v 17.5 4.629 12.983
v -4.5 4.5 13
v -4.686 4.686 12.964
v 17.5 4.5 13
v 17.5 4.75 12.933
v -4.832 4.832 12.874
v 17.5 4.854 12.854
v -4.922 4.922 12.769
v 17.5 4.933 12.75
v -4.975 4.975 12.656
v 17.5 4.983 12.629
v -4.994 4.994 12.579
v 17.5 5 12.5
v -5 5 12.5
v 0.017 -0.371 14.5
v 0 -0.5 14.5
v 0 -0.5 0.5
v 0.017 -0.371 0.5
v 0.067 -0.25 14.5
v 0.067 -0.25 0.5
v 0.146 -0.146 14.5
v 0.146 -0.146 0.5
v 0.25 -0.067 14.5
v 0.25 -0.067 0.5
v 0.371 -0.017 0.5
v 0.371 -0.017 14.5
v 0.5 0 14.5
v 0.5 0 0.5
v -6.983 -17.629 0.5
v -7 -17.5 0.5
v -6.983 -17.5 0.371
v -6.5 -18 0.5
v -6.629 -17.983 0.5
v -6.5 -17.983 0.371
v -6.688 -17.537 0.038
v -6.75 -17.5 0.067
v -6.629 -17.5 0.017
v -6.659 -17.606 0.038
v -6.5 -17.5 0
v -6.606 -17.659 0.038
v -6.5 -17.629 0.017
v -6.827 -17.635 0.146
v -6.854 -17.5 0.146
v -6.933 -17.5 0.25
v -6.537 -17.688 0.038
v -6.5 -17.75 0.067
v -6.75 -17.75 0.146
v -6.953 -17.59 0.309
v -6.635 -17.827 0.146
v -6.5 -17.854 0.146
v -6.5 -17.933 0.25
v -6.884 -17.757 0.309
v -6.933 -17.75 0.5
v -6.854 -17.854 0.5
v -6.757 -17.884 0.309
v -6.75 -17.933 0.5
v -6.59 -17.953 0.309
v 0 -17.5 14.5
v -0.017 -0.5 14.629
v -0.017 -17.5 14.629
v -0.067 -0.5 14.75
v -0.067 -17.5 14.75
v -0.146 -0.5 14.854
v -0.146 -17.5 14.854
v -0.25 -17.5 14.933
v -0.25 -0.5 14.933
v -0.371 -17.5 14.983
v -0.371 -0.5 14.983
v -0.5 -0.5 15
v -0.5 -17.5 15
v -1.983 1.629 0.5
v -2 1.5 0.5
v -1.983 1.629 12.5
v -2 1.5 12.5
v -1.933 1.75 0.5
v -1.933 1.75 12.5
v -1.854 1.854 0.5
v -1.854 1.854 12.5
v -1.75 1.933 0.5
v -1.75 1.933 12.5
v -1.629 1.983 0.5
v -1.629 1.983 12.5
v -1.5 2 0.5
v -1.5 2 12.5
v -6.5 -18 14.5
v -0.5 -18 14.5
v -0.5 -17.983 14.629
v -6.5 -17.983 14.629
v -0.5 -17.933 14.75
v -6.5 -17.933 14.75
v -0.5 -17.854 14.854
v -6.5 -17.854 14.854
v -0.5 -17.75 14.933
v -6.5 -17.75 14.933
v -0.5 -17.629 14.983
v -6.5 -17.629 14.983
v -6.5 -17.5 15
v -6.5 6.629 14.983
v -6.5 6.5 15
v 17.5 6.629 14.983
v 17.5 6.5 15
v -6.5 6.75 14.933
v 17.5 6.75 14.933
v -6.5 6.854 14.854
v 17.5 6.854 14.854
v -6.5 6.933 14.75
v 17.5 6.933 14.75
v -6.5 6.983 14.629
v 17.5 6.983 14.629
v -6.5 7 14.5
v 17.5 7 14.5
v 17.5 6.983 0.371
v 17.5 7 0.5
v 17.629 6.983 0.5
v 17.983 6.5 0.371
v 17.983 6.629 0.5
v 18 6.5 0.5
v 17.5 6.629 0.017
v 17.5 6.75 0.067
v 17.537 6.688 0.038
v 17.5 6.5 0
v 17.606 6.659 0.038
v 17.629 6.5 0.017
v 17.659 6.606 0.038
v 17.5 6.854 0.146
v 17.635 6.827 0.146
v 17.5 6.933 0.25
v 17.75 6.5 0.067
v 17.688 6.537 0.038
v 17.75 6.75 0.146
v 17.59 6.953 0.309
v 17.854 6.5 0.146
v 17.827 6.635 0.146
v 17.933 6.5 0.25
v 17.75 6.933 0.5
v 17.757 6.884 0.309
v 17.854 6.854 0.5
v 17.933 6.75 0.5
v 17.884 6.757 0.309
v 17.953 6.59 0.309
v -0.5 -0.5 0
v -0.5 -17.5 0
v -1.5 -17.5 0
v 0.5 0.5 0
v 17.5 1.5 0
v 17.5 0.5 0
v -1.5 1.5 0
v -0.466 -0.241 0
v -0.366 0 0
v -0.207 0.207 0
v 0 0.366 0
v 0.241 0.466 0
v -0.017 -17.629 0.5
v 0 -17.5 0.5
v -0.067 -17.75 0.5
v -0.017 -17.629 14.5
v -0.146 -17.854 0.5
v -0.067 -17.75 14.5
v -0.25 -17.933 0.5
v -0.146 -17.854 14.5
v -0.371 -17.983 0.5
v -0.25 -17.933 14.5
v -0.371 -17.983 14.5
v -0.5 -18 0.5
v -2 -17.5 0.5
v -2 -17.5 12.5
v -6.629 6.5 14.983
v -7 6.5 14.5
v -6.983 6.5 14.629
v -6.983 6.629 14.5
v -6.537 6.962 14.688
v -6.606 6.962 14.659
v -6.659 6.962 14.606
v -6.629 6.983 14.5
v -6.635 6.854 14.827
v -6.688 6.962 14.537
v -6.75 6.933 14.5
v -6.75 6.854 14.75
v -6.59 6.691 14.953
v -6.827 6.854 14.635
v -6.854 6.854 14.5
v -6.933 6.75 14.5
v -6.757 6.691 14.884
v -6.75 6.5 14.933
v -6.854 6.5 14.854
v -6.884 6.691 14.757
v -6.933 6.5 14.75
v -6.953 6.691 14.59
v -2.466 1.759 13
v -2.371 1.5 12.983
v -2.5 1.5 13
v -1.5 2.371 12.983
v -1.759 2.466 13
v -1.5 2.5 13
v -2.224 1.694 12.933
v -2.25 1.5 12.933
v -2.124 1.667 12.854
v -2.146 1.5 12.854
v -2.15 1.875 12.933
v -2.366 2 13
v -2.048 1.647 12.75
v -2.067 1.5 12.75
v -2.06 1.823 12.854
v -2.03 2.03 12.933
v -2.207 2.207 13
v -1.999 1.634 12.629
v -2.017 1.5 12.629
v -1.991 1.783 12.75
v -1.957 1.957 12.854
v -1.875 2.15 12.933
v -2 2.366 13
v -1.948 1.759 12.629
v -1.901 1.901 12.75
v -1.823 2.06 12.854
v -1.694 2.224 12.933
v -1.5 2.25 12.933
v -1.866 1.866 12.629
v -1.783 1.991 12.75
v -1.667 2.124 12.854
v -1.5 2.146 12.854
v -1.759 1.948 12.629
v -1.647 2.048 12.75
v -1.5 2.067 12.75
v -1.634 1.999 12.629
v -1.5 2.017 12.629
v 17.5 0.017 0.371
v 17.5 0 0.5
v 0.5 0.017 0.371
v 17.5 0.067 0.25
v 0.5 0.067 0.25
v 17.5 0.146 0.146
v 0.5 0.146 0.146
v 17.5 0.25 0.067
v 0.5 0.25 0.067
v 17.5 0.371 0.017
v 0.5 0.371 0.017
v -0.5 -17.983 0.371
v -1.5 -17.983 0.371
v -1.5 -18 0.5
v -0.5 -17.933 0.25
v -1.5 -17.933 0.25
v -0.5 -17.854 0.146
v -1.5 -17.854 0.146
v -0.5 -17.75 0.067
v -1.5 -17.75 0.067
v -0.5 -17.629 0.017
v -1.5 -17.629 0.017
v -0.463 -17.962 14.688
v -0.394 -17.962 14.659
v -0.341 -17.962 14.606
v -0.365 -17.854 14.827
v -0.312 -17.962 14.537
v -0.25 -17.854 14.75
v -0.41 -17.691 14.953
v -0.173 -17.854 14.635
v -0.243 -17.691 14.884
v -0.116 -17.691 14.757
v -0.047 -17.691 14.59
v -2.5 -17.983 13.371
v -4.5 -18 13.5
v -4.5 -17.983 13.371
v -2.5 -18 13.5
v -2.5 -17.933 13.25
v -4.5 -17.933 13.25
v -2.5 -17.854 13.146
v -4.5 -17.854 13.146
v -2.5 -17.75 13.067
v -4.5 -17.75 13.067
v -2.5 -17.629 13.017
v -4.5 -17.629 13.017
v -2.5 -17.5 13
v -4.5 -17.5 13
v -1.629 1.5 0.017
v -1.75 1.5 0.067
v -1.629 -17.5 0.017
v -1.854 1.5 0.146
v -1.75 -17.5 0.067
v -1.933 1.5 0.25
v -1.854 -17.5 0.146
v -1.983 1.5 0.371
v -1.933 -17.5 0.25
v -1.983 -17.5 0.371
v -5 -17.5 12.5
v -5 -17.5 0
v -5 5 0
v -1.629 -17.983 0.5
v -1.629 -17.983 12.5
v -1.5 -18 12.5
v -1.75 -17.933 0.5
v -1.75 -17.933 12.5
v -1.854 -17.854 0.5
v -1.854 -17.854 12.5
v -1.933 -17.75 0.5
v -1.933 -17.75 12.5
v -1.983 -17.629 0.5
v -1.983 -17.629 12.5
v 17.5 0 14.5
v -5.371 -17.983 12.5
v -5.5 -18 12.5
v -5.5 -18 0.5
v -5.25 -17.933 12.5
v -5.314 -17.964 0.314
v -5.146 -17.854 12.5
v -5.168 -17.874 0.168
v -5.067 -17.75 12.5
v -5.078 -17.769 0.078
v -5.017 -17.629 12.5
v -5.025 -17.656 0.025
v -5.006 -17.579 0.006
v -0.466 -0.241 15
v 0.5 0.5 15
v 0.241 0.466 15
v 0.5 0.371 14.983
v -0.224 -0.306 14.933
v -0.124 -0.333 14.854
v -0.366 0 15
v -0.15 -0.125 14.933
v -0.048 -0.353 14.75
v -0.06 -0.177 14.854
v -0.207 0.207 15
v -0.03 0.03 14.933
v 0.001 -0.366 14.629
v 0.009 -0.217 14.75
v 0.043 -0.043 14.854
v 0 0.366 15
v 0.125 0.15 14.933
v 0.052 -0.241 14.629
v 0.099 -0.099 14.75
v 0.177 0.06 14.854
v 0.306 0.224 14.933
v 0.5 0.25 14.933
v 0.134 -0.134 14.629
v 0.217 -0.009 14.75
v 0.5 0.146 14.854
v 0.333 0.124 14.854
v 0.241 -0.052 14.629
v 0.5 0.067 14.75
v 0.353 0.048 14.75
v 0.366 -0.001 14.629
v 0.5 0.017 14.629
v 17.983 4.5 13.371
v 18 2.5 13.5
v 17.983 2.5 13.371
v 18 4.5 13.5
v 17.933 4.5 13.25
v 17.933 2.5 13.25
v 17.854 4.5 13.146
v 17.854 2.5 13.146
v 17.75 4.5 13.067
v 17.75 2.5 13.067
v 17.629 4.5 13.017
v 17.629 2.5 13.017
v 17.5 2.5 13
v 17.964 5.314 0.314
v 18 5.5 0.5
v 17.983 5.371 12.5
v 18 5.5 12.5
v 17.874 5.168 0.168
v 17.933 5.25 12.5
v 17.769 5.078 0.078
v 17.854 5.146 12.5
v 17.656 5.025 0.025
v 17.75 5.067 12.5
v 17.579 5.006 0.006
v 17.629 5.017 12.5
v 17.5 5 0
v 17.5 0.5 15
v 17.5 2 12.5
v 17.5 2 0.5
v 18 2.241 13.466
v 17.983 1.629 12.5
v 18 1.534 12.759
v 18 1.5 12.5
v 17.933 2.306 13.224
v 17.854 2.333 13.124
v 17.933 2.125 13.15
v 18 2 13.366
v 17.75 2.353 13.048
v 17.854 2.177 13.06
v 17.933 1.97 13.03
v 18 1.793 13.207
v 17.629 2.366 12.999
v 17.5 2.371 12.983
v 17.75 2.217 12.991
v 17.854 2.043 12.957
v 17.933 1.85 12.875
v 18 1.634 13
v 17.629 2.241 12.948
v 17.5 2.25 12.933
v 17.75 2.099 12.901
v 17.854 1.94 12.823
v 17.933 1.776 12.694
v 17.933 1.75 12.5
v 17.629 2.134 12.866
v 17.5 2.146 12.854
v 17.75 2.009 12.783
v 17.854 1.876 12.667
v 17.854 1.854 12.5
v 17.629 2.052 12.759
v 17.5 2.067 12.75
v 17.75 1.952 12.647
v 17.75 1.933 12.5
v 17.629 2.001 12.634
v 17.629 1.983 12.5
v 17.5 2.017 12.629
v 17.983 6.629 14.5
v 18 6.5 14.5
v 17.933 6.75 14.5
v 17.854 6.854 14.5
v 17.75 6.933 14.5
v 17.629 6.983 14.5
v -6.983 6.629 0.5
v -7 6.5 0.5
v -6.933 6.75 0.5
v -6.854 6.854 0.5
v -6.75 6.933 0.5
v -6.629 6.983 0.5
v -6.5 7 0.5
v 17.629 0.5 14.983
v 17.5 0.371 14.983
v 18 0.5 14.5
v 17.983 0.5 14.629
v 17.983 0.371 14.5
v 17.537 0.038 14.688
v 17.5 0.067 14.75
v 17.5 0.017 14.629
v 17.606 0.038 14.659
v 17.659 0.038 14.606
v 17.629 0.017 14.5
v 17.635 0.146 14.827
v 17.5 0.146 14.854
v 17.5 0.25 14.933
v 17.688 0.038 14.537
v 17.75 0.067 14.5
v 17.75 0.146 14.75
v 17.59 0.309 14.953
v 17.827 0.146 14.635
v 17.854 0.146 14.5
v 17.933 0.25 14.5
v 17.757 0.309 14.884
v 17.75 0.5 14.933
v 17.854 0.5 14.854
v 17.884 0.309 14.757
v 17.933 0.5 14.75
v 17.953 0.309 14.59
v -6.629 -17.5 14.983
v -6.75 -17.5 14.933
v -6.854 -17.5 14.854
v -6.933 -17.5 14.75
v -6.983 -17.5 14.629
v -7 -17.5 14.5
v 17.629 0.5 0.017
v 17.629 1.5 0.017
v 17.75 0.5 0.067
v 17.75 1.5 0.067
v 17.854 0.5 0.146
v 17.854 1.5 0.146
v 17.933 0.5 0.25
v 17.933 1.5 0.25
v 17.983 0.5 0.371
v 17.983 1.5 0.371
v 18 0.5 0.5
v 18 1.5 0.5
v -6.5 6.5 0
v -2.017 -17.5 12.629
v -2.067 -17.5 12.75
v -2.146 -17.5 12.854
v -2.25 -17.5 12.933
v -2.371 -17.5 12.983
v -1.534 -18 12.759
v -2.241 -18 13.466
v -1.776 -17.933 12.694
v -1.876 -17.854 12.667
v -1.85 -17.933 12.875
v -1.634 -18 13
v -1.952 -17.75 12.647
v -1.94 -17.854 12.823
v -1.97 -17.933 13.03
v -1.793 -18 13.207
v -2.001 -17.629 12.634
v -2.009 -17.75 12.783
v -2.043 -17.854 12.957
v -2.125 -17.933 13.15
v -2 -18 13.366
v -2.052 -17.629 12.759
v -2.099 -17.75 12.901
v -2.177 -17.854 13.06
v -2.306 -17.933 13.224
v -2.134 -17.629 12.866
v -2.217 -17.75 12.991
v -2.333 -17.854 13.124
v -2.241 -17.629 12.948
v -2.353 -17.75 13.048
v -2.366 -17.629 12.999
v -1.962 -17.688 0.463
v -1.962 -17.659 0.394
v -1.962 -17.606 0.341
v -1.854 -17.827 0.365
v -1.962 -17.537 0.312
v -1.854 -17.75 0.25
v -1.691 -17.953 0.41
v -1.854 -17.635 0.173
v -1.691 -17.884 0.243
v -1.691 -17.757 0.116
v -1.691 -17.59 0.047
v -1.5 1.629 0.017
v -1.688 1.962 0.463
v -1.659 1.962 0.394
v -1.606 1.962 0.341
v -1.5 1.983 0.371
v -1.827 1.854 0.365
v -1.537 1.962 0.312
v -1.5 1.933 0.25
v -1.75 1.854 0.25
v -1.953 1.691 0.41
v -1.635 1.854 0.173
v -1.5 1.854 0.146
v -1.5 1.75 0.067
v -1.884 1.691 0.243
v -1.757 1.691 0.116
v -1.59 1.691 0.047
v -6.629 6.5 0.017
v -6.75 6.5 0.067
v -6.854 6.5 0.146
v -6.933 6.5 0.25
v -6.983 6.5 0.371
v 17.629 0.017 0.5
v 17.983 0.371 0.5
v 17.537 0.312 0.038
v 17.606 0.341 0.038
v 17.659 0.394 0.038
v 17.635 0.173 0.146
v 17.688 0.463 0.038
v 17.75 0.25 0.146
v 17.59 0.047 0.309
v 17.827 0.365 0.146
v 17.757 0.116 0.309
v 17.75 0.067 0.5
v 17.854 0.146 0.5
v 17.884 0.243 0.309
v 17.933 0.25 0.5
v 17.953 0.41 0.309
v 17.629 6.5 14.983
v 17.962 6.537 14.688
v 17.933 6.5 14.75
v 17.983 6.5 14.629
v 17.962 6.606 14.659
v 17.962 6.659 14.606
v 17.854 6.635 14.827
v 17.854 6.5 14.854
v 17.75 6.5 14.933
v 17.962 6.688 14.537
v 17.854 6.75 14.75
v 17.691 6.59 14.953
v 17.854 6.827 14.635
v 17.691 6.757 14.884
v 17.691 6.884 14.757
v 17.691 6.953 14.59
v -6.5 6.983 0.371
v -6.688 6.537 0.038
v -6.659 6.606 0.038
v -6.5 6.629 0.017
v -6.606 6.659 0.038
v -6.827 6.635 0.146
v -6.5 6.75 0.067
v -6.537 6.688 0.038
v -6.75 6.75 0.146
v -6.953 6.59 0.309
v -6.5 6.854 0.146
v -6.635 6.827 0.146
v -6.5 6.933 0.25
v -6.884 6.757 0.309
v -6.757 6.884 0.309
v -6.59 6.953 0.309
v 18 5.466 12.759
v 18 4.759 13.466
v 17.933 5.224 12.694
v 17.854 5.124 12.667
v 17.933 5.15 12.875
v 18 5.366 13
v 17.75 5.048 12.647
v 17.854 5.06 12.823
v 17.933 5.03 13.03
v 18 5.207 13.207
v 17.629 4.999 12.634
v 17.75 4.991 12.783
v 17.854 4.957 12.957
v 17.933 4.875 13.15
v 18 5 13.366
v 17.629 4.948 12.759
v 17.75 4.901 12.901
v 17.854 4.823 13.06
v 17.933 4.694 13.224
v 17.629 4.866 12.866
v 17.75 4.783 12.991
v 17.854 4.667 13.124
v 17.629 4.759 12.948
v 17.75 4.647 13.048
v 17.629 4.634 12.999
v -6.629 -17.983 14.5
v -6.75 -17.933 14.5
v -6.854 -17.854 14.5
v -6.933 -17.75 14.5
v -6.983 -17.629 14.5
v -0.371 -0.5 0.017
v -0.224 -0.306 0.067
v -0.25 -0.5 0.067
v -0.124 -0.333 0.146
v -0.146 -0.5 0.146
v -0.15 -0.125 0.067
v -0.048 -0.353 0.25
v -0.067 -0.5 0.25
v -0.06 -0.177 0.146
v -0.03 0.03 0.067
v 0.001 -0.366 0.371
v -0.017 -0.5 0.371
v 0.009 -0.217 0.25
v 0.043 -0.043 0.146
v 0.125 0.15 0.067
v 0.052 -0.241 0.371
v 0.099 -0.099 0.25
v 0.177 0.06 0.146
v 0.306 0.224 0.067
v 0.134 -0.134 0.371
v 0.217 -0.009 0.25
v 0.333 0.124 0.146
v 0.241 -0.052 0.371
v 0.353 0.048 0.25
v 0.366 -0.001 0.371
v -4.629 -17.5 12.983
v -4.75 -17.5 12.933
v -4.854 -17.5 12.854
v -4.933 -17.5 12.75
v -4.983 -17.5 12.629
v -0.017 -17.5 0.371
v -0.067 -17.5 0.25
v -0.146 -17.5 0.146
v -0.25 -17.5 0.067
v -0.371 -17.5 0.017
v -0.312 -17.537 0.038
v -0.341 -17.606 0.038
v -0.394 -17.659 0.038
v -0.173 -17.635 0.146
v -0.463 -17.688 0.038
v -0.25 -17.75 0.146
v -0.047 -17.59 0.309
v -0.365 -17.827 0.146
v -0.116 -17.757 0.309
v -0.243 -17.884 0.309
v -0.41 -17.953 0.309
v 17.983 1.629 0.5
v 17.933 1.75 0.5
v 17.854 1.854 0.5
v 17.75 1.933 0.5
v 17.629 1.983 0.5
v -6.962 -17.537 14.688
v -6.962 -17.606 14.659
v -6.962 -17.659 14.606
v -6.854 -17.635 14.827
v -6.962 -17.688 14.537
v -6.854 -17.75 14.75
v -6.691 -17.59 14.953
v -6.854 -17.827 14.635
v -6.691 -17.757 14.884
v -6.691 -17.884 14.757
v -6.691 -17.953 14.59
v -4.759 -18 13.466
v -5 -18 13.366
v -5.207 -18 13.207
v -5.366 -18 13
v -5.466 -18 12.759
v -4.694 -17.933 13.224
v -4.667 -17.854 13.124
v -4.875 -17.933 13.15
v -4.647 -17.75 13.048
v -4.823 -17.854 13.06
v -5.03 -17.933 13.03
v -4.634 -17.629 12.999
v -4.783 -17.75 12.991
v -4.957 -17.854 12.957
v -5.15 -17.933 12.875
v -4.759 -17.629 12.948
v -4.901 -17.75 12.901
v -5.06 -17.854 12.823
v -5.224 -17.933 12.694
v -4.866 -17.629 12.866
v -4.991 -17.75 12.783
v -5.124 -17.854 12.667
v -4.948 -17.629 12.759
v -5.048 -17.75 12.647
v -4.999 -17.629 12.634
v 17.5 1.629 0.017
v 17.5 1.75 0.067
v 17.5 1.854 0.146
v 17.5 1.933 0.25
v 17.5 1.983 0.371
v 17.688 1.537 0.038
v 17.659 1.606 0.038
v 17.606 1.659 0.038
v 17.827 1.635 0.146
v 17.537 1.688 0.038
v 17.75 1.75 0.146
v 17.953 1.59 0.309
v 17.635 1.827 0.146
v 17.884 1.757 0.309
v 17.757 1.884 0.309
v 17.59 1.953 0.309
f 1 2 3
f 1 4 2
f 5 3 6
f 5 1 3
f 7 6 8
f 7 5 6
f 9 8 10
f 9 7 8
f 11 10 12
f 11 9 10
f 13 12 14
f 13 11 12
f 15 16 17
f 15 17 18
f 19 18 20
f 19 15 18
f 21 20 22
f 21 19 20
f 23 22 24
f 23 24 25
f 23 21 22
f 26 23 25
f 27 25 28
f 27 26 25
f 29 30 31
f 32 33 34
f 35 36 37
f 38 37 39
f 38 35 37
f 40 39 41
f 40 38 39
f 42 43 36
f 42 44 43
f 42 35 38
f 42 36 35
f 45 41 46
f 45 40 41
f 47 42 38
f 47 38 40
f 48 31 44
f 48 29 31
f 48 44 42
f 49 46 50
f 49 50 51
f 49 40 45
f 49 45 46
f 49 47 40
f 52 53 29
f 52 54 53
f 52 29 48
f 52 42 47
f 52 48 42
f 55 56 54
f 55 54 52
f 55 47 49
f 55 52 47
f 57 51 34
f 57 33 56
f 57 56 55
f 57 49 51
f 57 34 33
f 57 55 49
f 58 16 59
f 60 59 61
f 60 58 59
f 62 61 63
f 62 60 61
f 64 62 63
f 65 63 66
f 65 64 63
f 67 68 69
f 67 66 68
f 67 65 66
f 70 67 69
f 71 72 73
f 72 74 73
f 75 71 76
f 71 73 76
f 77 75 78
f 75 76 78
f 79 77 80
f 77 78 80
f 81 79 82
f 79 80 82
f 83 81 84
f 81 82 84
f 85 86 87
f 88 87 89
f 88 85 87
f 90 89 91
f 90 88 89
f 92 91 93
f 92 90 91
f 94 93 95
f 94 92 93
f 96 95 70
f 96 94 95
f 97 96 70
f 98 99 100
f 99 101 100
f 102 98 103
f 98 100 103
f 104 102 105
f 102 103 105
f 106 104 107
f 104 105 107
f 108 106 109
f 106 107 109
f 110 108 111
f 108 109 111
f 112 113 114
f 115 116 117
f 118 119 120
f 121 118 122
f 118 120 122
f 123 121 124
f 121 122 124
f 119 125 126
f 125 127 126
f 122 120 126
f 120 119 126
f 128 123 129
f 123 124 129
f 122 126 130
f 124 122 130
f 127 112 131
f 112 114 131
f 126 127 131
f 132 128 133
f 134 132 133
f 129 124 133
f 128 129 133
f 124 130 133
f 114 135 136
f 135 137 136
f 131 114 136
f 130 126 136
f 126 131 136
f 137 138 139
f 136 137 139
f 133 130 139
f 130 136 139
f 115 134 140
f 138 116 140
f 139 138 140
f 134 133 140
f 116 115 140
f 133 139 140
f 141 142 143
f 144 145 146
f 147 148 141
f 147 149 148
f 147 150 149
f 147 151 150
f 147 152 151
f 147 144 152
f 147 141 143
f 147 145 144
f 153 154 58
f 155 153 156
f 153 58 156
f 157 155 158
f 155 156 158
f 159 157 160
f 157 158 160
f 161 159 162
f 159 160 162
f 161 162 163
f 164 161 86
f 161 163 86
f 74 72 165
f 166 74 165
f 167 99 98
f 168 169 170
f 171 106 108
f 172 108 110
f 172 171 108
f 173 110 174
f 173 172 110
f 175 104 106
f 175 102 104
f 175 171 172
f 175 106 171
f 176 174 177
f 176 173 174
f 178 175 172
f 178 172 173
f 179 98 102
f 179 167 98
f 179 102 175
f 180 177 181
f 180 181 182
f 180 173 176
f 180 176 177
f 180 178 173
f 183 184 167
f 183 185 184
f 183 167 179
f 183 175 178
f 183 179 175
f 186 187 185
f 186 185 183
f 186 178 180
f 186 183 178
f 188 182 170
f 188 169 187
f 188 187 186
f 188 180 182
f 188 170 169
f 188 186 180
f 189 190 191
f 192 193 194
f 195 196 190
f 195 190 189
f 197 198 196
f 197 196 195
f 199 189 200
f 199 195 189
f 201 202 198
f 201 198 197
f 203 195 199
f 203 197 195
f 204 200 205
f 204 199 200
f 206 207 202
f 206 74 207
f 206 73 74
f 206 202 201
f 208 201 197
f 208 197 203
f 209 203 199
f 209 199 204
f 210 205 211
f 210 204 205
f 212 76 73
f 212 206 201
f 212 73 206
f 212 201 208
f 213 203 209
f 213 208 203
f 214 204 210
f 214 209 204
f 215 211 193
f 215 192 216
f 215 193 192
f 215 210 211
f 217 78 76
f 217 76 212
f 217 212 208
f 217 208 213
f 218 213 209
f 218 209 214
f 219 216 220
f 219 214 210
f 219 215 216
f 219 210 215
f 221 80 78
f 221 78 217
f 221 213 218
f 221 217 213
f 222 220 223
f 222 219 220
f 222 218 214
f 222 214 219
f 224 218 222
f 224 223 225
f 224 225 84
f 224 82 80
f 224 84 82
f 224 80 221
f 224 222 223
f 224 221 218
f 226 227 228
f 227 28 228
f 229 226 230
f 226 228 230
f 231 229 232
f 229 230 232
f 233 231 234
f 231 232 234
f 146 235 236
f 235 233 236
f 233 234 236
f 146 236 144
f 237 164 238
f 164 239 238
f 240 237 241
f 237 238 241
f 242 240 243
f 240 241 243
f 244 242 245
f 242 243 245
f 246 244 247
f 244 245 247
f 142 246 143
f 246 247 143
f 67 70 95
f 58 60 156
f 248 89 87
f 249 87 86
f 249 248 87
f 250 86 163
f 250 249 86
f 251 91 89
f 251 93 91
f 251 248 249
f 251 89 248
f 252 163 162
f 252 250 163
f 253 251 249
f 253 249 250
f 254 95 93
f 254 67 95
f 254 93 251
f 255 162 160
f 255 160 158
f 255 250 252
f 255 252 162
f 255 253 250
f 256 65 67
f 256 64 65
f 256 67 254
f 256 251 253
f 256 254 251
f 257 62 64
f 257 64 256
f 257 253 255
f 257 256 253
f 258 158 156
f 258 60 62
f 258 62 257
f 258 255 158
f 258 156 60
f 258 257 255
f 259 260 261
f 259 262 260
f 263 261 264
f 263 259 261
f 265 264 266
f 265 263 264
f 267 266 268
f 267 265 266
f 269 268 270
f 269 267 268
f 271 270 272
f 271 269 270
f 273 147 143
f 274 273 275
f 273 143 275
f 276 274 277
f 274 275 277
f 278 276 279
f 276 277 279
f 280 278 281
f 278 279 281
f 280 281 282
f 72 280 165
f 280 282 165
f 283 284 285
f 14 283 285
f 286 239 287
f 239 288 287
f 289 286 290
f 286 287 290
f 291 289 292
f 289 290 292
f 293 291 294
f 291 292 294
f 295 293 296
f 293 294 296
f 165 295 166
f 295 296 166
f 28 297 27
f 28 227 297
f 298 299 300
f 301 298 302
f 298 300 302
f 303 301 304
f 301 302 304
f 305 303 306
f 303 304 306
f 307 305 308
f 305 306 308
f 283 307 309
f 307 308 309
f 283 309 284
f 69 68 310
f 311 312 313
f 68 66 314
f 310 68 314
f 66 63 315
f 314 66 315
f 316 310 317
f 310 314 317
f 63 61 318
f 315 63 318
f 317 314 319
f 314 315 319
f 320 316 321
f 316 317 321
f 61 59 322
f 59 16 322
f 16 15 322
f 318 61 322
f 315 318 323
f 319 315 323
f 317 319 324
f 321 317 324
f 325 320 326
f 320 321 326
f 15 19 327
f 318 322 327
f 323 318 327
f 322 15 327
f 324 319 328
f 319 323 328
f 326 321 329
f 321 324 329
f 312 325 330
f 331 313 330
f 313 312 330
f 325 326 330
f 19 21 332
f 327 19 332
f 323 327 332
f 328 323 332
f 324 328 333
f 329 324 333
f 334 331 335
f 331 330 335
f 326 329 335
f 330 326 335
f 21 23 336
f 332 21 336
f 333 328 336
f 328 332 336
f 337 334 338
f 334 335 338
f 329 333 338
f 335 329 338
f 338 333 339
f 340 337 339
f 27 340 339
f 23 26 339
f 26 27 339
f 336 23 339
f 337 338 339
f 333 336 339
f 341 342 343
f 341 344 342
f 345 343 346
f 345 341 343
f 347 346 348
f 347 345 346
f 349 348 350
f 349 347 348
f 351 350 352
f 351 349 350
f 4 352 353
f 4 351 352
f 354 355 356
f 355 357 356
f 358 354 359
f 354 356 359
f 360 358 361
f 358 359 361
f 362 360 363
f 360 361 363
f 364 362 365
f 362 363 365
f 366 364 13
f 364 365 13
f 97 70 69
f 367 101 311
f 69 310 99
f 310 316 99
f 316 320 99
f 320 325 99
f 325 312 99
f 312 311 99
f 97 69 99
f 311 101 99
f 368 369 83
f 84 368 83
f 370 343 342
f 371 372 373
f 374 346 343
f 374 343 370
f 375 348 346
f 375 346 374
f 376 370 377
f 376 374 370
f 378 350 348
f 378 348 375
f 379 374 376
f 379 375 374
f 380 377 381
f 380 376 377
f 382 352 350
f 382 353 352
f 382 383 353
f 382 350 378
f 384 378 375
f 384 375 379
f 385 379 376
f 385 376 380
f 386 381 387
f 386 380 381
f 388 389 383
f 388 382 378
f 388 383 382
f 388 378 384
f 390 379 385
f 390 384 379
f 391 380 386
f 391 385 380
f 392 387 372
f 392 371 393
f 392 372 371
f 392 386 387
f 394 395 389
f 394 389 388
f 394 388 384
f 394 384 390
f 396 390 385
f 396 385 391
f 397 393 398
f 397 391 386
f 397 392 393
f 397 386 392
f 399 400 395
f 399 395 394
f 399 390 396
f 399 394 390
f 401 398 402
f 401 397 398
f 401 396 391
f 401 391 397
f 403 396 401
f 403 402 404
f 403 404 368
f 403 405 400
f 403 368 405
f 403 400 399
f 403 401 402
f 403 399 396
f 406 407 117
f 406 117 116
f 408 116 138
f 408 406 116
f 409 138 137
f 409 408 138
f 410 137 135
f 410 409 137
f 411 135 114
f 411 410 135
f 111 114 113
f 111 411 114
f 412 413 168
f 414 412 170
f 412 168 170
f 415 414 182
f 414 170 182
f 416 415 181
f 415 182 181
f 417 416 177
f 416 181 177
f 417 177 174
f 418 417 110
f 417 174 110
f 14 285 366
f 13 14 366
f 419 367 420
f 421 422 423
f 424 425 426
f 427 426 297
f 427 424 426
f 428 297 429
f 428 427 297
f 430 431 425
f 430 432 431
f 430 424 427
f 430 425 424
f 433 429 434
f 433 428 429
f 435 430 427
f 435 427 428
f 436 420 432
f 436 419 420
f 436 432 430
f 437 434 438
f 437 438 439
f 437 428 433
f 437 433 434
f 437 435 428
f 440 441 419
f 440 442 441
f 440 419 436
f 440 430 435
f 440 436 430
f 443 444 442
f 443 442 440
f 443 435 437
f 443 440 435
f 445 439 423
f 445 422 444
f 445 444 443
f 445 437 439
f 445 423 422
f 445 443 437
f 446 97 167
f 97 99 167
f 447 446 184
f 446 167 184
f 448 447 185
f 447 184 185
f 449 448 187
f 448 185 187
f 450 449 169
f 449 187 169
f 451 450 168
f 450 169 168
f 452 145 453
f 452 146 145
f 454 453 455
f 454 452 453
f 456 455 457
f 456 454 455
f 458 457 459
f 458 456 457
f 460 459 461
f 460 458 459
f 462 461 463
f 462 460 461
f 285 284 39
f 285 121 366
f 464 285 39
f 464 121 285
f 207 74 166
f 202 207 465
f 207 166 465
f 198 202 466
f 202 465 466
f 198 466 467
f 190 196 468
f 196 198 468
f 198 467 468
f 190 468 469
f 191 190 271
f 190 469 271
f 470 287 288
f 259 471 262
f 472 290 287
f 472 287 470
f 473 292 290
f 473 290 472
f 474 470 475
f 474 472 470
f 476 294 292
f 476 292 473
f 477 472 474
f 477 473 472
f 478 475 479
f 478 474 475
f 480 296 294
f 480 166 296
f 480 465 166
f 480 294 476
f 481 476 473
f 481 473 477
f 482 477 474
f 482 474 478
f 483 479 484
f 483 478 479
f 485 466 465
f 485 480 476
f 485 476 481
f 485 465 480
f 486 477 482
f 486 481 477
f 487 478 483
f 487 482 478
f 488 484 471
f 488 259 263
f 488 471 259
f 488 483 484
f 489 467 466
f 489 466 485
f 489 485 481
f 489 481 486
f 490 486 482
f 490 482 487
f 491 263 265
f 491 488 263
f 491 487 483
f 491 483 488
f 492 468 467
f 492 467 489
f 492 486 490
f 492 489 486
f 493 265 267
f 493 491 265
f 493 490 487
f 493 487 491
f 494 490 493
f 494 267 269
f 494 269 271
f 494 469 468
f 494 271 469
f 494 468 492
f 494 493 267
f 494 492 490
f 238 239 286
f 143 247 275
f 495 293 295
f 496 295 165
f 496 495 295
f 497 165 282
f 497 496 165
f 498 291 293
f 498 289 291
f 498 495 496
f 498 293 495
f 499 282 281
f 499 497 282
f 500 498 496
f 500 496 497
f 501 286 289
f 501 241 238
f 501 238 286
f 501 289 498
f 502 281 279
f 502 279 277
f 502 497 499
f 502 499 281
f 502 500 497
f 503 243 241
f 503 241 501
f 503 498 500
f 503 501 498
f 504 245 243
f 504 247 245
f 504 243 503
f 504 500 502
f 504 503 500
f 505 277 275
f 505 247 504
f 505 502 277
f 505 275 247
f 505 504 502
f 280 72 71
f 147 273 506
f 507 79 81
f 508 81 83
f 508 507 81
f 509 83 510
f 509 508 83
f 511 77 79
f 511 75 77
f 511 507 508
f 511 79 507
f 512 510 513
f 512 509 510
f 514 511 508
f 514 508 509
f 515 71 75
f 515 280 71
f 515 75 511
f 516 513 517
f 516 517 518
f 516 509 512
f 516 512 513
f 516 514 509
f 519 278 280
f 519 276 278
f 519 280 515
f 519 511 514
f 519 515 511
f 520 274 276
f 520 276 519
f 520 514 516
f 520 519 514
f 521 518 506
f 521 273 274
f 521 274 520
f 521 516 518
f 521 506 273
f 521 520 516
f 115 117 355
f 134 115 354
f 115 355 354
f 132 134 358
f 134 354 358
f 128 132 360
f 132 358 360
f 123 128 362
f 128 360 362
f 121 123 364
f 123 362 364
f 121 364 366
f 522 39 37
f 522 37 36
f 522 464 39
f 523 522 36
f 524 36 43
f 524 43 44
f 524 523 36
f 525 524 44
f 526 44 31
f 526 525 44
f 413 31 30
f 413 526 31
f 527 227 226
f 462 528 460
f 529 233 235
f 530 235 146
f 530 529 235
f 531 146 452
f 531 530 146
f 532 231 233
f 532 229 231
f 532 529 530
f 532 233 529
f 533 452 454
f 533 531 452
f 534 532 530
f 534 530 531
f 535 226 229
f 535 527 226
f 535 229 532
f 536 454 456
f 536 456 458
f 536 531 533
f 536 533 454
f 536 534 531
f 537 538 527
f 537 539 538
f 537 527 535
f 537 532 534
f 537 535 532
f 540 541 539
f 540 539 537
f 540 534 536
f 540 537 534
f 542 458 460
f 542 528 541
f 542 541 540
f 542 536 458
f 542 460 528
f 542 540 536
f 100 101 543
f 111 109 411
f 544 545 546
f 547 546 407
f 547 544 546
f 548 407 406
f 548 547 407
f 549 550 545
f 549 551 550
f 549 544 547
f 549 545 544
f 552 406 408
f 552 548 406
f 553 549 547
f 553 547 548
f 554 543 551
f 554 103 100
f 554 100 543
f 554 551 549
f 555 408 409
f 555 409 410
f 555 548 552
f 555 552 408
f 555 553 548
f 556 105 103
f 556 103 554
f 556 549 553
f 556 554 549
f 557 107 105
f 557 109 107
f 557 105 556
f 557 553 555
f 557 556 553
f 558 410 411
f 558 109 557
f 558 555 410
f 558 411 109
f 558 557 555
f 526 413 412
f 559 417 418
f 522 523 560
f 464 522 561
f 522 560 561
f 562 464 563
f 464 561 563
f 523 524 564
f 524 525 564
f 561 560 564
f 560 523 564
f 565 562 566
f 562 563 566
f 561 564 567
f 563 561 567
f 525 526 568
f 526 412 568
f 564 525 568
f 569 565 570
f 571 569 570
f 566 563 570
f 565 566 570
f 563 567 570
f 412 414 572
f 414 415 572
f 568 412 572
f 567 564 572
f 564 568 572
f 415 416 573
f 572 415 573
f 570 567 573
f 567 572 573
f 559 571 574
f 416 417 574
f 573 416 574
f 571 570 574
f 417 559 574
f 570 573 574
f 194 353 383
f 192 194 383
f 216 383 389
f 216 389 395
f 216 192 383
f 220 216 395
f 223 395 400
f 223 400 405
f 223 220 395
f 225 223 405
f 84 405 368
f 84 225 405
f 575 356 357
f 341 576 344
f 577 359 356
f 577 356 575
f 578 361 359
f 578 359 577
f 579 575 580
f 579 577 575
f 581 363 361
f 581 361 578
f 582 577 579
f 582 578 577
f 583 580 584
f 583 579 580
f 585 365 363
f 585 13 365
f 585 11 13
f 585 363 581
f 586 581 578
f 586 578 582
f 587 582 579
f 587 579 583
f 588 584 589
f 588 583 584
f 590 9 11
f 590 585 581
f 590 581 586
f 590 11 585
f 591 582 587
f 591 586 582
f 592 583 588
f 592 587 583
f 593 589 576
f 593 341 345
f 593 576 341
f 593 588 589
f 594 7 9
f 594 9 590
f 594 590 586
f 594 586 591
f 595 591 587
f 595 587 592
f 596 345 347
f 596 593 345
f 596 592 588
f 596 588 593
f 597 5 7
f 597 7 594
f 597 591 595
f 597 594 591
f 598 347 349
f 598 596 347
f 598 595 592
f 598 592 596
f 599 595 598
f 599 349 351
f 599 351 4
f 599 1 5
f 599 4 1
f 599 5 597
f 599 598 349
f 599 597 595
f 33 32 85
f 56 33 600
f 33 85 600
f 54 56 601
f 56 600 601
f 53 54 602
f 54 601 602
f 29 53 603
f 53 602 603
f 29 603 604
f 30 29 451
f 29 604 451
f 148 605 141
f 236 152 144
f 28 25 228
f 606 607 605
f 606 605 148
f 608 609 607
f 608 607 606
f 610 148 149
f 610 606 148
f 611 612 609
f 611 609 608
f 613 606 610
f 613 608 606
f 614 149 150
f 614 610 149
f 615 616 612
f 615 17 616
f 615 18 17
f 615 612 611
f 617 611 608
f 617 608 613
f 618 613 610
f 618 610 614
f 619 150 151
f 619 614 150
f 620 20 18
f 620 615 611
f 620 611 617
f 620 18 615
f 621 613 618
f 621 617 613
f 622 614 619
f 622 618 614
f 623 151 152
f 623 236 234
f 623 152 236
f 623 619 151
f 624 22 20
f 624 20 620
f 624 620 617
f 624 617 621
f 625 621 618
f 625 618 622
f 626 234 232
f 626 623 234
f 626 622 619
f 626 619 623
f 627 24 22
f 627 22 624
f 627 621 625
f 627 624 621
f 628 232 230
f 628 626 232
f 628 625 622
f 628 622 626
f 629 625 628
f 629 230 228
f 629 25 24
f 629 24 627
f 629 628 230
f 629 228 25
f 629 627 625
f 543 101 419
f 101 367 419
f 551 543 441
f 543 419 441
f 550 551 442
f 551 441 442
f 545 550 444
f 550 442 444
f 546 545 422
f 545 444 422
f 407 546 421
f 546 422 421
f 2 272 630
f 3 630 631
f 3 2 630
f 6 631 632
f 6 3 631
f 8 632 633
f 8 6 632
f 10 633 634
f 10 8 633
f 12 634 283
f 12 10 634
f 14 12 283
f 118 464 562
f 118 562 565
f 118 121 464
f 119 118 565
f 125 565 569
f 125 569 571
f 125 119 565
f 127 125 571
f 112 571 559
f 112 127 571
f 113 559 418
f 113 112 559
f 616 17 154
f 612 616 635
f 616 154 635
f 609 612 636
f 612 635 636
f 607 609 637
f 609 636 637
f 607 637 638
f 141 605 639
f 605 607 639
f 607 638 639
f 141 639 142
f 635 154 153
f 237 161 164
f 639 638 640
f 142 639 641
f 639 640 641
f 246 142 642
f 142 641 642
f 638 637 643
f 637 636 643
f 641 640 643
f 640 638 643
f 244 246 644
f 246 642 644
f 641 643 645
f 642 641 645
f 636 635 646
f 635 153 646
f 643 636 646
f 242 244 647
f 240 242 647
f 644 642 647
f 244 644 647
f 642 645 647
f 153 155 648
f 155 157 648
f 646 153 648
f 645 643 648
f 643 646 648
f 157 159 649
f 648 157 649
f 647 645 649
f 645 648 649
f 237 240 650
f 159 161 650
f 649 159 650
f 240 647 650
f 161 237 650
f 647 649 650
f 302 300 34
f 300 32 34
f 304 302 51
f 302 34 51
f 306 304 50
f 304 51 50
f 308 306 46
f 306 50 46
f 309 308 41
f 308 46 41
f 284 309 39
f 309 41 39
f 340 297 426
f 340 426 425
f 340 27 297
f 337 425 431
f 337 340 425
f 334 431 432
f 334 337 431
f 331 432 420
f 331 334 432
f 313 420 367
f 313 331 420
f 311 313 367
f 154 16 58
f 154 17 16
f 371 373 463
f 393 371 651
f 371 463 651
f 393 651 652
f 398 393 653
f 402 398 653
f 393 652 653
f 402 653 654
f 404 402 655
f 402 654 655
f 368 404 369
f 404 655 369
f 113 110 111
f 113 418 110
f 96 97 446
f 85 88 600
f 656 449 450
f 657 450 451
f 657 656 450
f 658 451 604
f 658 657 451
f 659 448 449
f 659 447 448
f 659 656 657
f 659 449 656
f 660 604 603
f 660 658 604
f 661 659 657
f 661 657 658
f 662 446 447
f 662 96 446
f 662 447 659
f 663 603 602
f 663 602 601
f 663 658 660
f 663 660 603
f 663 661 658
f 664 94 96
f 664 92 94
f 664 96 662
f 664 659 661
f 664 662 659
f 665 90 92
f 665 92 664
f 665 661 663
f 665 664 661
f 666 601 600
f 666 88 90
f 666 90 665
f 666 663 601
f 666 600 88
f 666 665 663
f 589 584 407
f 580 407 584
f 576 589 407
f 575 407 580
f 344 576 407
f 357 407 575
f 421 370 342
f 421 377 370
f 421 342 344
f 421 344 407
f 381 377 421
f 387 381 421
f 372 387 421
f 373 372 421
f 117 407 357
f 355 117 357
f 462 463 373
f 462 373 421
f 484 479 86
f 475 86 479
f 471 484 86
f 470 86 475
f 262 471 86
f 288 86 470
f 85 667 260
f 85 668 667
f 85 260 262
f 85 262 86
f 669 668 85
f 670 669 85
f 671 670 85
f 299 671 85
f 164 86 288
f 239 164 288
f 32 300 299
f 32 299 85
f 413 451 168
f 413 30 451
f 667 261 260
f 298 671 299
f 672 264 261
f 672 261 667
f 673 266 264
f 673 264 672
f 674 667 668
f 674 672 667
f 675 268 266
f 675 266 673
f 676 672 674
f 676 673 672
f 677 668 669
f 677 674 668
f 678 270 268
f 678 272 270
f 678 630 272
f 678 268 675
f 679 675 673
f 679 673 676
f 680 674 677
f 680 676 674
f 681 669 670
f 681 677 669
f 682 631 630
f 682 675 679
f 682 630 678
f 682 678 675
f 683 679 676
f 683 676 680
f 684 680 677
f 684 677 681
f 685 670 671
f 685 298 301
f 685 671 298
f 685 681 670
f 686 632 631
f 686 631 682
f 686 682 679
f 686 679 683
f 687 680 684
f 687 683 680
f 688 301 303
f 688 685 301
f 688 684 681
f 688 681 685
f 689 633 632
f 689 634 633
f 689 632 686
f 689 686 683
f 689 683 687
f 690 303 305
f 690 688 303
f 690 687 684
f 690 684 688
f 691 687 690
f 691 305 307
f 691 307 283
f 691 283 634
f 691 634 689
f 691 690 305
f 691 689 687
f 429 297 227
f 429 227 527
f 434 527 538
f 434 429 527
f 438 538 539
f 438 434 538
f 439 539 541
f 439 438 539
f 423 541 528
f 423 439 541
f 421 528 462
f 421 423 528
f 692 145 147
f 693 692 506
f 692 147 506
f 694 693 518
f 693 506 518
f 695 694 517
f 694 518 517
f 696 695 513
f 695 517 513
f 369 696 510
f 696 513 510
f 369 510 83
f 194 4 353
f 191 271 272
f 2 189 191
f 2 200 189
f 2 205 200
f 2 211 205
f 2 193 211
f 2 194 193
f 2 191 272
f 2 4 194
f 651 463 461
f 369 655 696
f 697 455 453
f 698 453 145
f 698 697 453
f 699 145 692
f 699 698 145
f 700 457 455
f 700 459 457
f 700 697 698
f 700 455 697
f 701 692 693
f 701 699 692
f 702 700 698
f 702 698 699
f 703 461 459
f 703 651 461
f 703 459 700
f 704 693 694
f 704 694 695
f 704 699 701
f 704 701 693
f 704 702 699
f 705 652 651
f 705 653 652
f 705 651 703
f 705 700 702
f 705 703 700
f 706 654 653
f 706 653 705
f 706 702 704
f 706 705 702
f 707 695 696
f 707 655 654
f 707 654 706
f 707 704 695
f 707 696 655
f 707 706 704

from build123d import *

# Parameters (mm, degrees)
PAD_DEPTH    = 15
POCKET_DEPTH = 13
FILLET_R     = 0.5


with BuildPart() as part:
    # Sketch → Pad (new body)
    with BuildSketch(Plane.XY):
        Polygon((0, 0), (0, -18), (-7, -18), (-7, 7), (18, 7), (18, 0), align=None)
    extrude(amount=PAD_DEPTH)

    # Sketch001 → Pocket (cut)
    with BuildSketch(Plane.XY):
        Polygon((-2, 2), (-2, -20), (-5, -20), (-5, 5), (20, 5), (20, 2), align=None)
    extrude(amount=POCKET_DEPTH, mode=Mode.SUBTRACT)

    # Fillet
    fillet_edges = [part.edges().sort_by_distance(p)[0] for p in [
        (0, -9, 15),
        (-3.5, -18, 15),
        (-7, -5.5, 15),
        (5.5, 7, 15),
        (18, 3.5, 15),
        (9, 0, 15),
        (-7, -18, 7.5),
        (-7, 7, 7.5),
        (-7, -5.5, 0),
        (0, 0, 7.5),
        (0, -18, 7.5),
        (0, -9, 0),
        (18, 0, 7.5),
        (9, 0, 0),
        (18, 7, 7.5),
        (5.5, 7, 0),
        (-1, -18, 0),
        (-2, -18, 6.5),
        (-3.5, -18, 13),
        (-5, -18, 6.5),
        (-6, -18, 0),
        (18, 6, 0),
        (18, 5, 6.5),
        (18, 3.5, 13),
        (18, 2, 6.5),
        (18, 1, 0),
        (-2, -8, 13),
        (-5, -6.5, 13),
        (6.5, 5, 13),
        (8, 2, 13),
        (-2, -8, 0),
        (-2, 2, 6.5),
        (8, 2, 0),
    ]]
    fillet(fillet_edges, radius=FILLET_R)


solid = part.part
